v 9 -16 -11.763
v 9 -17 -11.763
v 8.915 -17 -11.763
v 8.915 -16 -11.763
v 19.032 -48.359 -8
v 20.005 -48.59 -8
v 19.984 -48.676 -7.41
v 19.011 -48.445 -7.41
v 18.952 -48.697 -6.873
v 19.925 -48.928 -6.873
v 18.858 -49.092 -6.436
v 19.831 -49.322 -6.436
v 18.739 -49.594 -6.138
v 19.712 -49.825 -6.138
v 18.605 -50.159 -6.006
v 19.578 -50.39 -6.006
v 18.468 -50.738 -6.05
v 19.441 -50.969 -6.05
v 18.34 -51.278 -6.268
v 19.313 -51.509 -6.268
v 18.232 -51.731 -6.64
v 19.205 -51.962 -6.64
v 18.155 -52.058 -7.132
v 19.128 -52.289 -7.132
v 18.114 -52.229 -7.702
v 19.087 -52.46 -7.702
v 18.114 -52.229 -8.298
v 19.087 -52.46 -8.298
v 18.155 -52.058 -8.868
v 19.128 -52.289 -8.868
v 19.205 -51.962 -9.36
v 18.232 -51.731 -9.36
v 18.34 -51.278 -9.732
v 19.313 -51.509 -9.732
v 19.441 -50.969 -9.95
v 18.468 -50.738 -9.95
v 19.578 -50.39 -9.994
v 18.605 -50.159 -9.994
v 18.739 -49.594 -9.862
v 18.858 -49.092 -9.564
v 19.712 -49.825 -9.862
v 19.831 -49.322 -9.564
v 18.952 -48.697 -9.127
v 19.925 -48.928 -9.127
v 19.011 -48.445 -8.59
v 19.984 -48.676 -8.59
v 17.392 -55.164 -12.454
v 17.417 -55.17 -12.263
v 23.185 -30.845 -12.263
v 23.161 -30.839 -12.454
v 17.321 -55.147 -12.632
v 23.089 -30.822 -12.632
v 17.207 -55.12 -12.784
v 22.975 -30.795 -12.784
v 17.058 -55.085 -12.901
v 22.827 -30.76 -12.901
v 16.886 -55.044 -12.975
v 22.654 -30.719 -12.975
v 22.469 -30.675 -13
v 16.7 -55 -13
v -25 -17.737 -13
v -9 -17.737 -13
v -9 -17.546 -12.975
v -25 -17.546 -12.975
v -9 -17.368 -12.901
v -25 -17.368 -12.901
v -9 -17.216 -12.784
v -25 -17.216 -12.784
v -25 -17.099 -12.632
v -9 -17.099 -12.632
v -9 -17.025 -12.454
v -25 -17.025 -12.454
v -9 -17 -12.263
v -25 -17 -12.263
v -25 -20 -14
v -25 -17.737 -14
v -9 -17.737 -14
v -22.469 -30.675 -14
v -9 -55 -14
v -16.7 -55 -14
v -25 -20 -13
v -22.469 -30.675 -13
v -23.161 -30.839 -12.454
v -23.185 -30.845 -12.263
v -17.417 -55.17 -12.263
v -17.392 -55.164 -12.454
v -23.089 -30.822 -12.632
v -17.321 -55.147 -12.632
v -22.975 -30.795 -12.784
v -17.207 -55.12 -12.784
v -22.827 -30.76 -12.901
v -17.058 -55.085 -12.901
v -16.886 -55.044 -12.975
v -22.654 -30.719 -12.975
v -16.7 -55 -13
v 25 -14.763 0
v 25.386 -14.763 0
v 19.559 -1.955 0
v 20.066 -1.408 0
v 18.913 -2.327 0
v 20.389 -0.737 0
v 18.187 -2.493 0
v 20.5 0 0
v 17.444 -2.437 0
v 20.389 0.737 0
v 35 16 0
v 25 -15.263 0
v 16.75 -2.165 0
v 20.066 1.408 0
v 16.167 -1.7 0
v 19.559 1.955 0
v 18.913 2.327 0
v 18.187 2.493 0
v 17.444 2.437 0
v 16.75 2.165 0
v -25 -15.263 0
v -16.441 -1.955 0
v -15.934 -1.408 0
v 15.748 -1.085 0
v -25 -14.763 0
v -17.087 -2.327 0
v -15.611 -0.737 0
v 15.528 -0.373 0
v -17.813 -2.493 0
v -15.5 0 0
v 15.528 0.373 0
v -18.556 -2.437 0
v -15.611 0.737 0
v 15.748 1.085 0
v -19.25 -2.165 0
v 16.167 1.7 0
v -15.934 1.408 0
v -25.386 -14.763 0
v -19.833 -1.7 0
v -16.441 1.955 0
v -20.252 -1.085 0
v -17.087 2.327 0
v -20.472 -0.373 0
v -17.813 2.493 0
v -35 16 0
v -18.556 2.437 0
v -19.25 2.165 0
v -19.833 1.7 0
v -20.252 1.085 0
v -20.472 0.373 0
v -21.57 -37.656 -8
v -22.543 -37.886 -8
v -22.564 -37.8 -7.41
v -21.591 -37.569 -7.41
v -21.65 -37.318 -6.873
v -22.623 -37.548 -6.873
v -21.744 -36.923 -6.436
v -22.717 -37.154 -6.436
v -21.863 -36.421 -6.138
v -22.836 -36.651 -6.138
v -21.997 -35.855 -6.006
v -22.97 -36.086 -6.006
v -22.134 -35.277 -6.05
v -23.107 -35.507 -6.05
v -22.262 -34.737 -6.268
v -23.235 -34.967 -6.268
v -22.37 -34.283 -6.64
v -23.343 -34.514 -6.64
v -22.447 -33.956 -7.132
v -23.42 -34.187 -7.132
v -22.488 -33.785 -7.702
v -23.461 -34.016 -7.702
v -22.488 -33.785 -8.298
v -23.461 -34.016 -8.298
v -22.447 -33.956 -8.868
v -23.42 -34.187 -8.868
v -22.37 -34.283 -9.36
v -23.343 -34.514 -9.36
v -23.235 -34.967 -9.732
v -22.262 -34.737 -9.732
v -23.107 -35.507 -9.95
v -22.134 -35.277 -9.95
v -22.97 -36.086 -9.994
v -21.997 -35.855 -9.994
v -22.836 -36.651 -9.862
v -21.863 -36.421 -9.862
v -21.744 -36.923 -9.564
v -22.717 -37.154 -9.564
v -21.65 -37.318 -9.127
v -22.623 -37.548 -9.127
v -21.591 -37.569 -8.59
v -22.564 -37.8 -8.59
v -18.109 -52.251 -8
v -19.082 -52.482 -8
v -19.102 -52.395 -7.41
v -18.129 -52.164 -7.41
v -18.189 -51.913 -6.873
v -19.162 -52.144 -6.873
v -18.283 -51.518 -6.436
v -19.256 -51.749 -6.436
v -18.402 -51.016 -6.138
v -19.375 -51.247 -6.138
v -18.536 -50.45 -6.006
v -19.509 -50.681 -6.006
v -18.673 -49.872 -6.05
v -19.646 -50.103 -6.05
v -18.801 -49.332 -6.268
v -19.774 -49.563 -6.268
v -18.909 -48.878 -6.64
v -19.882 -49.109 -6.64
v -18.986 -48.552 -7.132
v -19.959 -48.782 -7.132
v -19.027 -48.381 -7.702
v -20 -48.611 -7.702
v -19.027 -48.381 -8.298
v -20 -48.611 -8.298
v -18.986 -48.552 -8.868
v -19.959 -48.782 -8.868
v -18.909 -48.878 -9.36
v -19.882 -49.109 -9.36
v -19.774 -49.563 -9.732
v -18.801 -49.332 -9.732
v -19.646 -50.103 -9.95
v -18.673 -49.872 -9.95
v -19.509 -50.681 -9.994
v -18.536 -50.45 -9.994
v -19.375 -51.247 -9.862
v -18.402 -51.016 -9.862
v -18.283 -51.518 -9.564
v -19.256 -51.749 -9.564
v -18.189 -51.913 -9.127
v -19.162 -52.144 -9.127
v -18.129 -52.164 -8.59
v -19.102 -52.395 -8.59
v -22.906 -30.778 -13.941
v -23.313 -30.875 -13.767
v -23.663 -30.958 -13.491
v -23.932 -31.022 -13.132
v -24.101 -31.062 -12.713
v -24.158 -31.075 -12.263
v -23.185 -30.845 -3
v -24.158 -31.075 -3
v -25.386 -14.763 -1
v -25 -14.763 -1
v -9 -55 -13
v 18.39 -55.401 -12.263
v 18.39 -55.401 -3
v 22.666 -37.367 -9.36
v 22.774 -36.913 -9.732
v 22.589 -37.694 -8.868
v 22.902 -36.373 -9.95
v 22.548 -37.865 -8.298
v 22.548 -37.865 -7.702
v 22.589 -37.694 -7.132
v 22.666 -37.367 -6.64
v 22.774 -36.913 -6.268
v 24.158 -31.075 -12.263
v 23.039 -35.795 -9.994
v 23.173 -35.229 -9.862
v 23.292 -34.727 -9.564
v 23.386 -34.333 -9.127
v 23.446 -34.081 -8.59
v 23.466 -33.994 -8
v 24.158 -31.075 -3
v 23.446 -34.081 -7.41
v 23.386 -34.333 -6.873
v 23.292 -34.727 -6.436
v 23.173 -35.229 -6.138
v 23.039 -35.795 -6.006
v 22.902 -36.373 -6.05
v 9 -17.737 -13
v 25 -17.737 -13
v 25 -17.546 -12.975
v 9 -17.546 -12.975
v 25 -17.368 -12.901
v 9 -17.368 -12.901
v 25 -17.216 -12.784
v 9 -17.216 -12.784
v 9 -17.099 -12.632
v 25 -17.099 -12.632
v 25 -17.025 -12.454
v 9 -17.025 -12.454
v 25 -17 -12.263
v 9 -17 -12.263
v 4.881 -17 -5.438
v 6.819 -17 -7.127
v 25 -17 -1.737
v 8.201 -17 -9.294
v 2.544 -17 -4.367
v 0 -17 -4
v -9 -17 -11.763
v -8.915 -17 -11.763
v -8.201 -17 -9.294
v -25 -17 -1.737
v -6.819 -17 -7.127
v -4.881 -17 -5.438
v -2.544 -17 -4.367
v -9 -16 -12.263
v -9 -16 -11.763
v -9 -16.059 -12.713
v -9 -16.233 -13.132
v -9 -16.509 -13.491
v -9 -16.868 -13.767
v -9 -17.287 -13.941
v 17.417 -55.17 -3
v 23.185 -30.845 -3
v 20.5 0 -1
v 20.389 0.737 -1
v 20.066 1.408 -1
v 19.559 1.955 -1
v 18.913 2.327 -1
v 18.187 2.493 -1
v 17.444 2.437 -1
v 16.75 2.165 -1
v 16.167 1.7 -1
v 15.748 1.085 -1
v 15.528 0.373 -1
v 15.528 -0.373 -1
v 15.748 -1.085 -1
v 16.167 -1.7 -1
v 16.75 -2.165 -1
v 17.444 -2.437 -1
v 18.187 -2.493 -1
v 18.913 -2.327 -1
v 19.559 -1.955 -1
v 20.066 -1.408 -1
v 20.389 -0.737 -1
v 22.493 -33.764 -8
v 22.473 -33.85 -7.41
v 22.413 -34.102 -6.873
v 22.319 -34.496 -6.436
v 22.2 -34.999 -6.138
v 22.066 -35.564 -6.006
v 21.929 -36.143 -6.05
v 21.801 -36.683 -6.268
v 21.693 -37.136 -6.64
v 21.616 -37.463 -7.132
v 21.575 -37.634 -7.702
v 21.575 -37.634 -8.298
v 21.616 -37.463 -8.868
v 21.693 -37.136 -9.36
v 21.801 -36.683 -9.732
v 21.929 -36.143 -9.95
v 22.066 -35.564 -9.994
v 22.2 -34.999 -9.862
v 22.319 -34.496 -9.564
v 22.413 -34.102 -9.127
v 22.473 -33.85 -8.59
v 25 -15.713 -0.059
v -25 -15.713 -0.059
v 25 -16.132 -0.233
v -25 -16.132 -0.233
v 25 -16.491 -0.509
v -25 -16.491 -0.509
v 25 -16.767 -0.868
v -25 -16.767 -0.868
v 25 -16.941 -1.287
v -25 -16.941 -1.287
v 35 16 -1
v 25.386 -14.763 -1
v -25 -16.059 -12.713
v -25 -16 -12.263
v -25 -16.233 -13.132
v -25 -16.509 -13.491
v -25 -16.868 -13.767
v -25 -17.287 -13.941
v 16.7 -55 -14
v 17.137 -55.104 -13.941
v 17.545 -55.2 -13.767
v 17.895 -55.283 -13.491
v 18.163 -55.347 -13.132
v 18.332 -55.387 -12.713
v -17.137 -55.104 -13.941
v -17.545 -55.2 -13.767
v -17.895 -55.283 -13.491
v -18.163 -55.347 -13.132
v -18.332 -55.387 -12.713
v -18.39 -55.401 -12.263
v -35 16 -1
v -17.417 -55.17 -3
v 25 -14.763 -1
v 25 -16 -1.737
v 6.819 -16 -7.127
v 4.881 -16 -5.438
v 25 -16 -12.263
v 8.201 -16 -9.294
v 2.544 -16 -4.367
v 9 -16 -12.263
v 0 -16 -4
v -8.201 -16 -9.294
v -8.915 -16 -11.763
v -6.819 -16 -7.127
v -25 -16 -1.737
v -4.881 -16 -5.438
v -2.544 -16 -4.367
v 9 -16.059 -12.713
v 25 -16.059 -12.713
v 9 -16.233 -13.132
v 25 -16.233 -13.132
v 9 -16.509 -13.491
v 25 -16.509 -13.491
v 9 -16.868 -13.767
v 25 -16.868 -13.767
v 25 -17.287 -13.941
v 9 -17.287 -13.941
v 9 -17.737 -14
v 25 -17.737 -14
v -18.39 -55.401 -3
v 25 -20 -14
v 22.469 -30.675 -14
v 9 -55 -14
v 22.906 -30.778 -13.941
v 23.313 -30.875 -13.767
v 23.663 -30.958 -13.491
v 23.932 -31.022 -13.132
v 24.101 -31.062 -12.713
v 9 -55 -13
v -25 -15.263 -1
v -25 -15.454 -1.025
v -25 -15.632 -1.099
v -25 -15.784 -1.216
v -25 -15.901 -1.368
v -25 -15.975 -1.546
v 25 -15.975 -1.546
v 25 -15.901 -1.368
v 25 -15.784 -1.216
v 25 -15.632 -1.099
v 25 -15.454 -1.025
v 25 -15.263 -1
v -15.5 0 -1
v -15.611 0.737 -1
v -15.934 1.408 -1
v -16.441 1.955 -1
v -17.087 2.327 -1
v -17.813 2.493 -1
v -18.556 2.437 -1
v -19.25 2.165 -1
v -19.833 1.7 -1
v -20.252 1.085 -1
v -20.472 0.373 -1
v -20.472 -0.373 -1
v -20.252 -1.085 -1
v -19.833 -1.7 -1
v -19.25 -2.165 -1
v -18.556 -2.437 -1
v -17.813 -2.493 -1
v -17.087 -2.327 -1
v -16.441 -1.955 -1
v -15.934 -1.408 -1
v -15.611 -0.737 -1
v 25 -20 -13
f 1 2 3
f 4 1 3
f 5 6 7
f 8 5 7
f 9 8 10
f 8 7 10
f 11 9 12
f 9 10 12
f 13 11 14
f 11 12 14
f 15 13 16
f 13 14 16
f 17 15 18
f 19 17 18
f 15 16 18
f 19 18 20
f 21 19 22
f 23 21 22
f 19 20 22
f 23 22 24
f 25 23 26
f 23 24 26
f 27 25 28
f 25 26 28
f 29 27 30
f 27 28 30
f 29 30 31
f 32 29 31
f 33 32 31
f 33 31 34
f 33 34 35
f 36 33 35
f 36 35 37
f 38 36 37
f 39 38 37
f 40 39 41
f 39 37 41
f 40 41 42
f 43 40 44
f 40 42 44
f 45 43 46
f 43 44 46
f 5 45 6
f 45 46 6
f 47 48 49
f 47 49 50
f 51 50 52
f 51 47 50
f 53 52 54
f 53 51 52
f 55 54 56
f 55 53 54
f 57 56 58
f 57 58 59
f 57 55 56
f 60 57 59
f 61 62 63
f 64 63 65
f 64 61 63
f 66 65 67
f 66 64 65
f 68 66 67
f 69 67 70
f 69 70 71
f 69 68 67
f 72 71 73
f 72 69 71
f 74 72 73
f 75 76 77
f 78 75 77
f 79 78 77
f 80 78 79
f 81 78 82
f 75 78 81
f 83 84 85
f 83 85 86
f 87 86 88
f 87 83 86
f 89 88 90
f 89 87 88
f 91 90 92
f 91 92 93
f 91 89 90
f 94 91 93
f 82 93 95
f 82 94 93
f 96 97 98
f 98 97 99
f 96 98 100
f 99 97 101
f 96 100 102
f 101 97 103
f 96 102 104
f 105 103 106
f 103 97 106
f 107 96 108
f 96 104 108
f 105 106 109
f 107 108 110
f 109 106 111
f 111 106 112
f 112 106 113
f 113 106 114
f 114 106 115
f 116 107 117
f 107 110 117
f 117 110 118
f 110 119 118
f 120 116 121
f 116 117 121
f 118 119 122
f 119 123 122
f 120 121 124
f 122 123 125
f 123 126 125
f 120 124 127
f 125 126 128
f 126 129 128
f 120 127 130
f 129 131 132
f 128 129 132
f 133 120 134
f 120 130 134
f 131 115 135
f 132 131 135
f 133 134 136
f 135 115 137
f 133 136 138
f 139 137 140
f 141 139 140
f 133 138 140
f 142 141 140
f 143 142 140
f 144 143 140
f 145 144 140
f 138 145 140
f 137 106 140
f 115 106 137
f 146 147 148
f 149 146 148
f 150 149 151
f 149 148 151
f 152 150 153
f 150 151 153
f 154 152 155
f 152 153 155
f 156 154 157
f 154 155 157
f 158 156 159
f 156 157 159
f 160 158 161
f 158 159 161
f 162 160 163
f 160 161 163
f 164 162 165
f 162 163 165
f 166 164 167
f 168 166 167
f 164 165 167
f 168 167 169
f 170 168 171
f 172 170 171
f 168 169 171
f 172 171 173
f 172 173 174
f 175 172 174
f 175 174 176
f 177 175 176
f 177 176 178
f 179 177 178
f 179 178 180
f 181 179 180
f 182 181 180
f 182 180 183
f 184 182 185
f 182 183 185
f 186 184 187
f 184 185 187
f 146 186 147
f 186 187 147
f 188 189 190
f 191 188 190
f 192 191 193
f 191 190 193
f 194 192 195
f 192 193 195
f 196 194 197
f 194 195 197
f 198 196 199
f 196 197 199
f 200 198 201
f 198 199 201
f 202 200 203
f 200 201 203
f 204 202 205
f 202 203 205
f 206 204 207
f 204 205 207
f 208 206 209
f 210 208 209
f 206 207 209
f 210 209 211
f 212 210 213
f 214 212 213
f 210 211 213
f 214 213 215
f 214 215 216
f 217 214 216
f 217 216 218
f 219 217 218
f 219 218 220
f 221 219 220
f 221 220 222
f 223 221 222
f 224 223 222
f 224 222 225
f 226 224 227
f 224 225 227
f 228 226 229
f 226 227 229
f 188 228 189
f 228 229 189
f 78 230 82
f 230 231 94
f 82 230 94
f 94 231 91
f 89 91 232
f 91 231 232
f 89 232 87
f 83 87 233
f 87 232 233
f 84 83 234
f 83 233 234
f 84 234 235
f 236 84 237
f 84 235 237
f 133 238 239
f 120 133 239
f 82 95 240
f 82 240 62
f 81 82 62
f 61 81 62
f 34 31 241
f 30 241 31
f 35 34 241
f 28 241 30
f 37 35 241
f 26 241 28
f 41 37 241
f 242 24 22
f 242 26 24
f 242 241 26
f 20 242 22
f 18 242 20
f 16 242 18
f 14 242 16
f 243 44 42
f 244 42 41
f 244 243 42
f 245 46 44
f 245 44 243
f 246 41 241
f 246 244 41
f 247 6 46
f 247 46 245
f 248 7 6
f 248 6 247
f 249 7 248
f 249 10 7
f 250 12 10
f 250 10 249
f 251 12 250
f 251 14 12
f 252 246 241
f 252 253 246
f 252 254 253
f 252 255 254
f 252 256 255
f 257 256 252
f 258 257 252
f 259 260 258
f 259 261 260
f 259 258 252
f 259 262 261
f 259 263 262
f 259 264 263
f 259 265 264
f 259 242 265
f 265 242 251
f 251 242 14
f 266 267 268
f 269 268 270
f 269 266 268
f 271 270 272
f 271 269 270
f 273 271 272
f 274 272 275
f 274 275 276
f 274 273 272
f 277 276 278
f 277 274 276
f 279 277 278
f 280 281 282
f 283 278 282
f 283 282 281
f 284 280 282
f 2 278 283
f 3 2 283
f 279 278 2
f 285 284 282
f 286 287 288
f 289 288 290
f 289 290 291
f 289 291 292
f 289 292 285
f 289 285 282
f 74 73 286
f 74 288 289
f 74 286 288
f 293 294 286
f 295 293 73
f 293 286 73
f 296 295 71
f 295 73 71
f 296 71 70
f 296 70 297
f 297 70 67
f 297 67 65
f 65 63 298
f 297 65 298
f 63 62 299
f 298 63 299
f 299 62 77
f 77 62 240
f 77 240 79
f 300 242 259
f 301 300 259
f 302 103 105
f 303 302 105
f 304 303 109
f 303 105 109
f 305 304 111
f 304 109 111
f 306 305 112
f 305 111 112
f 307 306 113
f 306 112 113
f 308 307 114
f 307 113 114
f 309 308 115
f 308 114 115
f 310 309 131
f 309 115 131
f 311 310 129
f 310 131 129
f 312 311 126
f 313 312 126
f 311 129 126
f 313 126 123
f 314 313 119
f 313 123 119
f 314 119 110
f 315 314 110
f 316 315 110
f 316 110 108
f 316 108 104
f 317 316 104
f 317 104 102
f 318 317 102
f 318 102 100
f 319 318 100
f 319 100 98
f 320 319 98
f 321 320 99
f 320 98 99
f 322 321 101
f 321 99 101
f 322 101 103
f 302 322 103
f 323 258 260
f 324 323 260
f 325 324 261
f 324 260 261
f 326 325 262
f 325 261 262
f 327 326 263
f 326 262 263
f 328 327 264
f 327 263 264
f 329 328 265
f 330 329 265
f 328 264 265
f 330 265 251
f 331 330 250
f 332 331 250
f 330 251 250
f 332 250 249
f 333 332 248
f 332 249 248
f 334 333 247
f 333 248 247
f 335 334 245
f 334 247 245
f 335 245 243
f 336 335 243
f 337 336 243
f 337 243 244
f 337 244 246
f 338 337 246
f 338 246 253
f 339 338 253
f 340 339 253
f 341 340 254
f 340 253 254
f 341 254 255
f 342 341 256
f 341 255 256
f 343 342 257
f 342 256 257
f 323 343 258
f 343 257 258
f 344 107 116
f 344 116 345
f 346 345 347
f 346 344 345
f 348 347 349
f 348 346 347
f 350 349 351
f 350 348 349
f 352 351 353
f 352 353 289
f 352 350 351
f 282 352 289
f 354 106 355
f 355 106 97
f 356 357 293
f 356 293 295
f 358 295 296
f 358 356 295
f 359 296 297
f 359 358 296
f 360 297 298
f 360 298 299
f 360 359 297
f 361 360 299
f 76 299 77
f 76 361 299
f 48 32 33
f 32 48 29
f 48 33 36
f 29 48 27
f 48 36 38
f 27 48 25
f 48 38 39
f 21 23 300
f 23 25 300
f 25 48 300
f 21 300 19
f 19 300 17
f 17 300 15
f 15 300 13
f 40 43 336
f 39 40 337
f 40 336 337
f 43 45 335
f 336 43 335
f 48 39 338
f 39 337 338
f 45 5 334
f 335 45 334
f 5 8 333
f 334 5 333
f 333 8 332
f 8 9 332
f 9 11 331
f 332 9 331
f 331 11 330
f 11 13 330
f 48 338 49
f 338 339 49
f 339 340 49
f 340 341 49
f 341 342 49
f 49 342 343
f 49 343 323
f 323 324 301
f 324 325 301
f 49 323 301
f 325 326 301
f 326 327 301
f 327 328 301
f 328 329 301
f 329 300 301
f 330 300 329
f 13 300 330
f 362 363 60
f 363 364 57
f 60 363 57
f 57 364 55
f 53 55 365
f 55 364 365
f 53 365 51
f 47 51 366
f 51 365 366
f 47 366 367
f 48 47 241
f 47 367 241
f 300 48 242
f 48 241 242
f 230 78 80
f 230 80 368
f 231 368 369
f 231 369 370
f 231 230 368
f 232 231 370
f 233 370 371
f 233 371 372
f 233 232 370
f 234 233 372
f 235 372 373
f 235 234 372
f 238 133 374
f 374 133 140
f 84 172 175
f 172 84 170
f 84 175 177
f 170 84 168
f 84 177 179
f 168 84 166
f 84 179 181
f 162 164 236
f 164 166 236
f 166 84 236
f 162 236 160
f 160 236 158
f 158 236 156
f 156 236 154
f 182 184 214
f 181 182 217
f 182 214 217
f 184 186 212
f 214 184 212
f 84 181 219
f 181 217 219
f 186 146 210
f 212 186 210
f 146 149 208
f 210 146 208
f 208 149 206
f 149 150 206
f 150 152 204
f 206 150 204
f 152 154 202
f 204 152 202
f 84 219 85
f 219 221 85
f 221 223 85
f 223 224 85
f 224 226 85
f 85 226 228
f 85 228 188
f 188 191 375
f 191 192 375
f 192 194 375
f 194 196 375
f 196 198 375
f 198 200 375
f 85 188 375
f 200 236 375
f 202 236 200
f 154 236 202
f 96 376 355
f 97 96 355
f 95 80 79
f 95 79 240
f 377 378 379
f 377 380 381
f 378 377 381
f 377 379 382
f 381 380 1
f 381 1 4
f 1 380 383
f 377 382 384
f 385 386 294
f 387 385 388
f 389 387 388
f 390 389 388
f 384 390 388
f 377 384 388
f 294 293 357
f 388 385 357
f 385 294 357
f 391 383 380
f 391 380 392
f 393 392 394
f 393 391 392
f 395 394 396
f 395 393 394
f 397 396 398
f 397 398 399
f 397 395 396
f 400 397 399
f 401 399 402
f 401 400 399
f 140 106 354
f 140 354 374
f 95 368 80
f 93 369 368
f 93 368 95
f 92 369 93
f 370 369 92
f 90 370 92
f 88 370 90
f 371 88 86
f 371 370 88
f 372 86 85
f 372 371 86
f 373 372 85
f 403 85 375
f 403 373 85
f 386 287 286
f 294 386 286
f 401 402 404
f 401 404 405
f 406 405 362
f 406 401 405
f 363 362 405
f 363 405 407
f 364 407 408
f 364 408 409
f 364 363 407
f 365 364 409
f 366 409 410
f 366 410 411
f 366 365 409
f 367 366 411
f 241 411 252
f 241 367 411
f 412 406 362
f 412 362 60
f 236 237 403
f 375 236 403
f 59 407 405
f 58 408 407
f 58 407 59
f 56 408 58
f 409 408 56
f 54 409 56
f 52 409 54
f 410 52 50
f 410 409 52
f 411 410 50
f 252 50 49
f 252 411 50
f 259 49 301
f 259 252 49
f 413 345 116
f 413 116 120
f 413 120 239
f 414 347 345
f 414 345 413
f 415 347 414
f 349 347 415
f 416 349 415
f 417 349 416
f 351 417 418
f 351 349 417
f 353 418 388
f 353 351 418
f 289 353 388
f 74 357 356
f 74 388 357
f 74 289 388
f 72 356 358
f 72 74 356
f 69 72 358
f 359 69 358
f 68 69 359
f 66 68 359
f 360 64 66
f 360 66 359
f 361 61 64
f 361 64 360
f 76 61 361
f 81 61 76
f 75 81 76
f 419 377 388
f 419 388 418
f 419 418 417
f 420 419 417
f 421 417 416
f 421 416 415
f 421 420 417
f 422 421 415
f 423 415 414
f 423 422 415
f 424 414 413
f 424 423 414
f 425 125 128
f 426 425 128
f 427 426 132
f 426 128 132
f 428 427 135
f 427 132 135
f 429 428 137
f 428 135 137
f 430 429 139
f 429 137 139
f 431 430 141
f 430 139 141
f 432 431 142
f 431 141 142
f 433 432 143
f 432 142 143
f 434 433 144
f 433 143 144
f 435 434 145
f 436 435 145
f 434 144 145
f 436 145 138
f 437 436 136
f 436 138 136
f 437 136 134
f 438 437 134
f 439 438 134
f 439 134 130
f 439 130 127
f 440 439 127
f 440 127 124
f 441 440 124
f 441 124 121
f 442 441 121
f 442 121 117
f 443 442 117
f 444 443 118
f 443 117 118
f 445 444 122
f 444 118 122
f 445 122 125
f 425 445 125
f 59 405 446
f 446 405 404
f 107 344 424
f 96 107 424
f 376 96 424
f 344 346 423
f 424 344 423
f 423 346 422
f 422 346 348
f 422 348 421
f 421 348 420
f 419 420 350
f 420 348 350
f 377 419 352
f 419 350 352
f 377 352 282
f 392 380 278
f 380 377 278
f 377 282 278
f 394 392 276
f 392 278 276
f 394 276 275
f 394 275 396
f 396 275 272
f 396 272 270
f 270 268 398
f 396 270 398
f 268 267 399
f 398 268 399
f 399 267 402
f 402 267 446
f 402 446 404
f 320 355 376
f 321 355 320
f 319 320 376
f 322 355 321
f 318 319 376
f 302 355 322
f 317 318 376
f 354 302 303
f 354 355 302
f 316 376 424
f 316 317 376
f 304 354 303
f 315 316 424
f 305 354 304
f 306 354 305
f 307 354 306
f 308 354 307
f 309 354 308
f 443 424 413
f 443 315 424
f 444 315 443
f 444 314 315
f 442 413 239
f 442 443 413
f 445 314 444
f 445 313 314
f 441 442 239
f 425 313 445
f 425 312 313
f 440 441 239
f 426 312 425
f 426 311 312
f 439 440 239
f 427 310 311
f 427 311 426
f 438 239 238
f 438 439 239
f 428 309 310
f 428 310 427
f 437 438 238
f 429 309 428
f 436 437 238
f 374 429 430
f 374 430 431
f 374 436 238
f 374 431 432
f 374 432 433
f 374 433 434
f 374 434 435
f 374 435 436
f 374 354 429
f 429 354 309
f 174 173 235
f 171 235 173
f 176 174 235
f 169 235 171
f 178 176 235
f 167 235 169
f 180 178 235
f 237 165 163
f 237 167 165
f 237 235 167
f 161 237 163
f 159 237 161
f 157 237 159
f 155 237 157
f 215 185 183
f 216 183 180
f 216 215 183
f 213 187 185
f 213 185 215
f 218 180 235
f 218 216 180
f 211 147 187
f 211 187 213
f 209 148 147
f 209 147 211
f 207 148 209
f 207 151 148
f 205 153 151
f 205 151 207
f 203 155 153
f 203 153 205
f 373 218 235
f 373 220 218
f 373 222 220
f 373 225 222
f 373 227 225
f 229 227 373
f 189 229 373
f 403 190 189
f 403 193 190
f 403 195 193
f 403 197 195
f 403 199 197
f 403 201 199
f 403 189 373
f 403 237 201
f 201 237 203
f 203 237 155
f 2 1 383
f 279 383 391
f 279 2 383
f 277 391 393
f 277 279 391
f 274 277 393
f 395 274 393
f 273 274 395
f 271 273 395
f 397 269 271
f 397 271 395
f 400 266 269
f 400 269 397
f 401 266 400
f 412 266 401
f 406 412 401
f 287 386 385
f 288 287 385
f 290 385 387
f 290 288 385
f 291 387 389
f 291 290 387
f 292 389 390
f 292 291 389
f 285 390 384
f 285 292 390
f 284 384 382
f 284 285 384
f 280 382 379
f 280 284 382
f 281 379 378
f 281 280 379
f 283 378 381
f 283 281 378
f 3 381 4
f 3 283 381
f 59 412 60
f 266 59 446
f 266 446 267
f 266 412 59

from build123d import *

# Parameters (mm, degrees)
IZIM1_R                         = 2.5
TABAN_FLAN_1_DEPTH              = 1
KENAR_FLAN_1_STRIP_W            = 5.4732
KENAR_FLAN_1_STRIP_H            = 1
KENAR_FLAN_1_STRIP_CUT_DEPTH    = 50
KENAR_FLAN_1_RELIEF_W           = 5.9732
KENAR_FLAN_1_RELIEF_H           = 0.5
KENAR_FLAN_1_RELIEF_CUT_DEPTH   = 1
KENAR_FLAN_1_DEPTH              = 50
KENAR_FLAN_1_START              = 1
KENAR_FLAN_1_FLAT_DEPTH         = 1
KENAR_FLAN_2_STRIP_W            = 5.4732
KENAR_FLAN_2_STRIP_H            = 1
KENAR_FLAN_2_STRIP_CUT_DEPTH    = 16
KENAR_FLAN_2_RELIEF_W           = 5.9732
KENAR_FLAN_2_RELIEF_H           = 0.5
KENAR_FLAN_2_RELIEF_CUT_DEPTH   = 1
KENAR_FLAN_2_STRIP_2_W          = 5.4732
KENAR_FLAN_2_STRIP_2_H          = 1
KENAR_FLAN_2_STRIP_CUT_2_DEPTH  = 16
KENAR_FLAN_2_RELIEF_2_W         = 5.9732
KENAR_FLAN_2_RELIEF_2_H         = 0.5
KENAR_FLAN_2_RELIEF_CUT_2_DEPTH = 1
KENAR_FLAN_2_DEPTH              = 16
KENAR_FLAN_2_BEND_DEPTH         = 16
KES_EKSTR_ZYON1_DEPTH           = 10
KENAR_FLAN_3_DEPTH              = 25
KENAR_FLAN_3_START              = 1
KENAR_FLAN_3_PROFILE_W          = 25
KENAR_FLAN_3_PROFILE_H          = 9.2634
KENAR_FLAN_3_PROFILE_R          = 2
KENAR_FLAN_3_FLAT_DEPTH         = 1
KENAR_FLAN_3_BEND_DEPTH         = 25
KENAR_FLAN_3_PROFILE_2_W        = 25
KENAR_FLAN_3_PROFILE_2_H        = 9.2634
KENAR_FLAN_3_PROFILE_2_R        = 2
KENAR_FLAN_3_FLAT_2_DEPTH       = 1


# Sheet-metal steps are written as plain solids
with BuildPart() as part:
    # Çizim1 → Taban-Flanş1 (new body)
    with BuildSketch(Plane.XY):
        Polygon((-25, 16), (25, 16), (35, 16), (25, -16), (-25, -16), (-35, 16), align=None)
        with Locations((-18, 0)):
            Circle(IZIM1_R, mode=Mode.SUBTRACT)
        with Locations((18, 0)):
            Circle(IZIM1_R, mode=Mode.SUBTRACT)
    extrude(amount=-TABAN_FLAN_1_DEPTH)

    # Kenar-Flanş1 strip (across the edge) → Kenar-Flanş1 strip cut (cut)
    with BuildSketch(Plane(origin=(25, -16, -1), x_dir=(0, 1, 0), z_dir=(-1, 0, 0))):
        with Locations((-2, -0.5)):
            Rectangle(KENAR_FLAN_1_STRIP_W, KENAR_FLAN_1_STRIP_H)
    extrude(amount=KENAR_FLAN_1_STRIP_CUT_DEPTH, mode=Mode.SUBTRACT)

    # Kenar-Flanş1 relief (on the sheet) → Kenar-Flanş1 relief cut (cut)
    with BuildSketch(Plane(origin=(25, -15.2634, -1), x_dir=(0, 1, 0), z_dir=(0, 0, -1))):
        with Locations((-2.4866, 0.25)):
            Rectangle(KENAR_FLAN_1_RELIEF_W, KENAR_FLAN_1_RELIEF_H)
        with Locations((-2.4866, -50.25)):
            Rectangle(KENAR_FLAN_1_RELIEF_W, KENAR_FLAN_1_RELIEF_H)
    extrude(amount=-KENAR_FLAN_1_RELIEF_CUT_DEPTH, mode=Mode.SUBTRACT)

    # Kenar-Flanş1 bend section (across the edge) → Kenar-Flanş1 (add)
    with BuildSketch(Plane(origin=(25, -16, -1), x_dir=(0, 1, 0), z_dir=(-1, 0, 0))):
        with BuildLine():
            Line((-1, 0.7366), (0, 0.7366))
            ThreePointArc((0, 0.7366), (0.215745145, 0.215745145), (0.7366, 0))
            Line((0.7366, 0), (0.7366, -1))
            ThreePointArc((0.7366, -1), (-0.491361636, -0.491361636), (-1, 0.7366))
        make_face()
    extrude(amount=KENAR_FLAN_1_DEPTH)

    # Kenar-Flanş1 profile (on flange) → Kenar-Flanş1 flat (add)
    with BuildSketch(Plane(origin=(0, -16, -1), x_dir=(-1, 0, 0), z_dir=(0, -1, 0)).offset(KENAR_FLAN_1_START)):
        with BuildLine():
            Line((25, 0.7366), (25, 12))
            Line((25, 12), (9, 12))
            ThreePointArc((9, 12), (0, 3), (-9, 12))
            Line((-9, 12), (-25, 12))
            Line((-25, 12), (-25, 0.7366))
            Line((-25, 0.7366), (25, 0.7366))
        make_face()
    extrude(amount=-KENAR_FLAN_1_FLAT_DEPTH)

    # Kenar-Flanş2 strip (across the edge) → Kenar-Flanş2 strip cut (cut)
    with BuildSketch(Plane(origin=(9, -17, -13), x_dir=(0, 0, 1), z_dir=(1, 0, 0))):
        with Locations((-2, -0.5)):
            Rectangle(KENAR_FLAN_2_STRIP_W, KENAR_FLAN_2_STRIP_H)
    extrude(amount=KENAR_FLAN_2_STRIP_CUT_DEPTH, mode=Mode.SUBTRACT)

    # Kenar-Flanş2 relief (on the sheet) → Kenar-Flanş2 relief cut (cut)
    with BuildSketch(Plane(origin=(9, -17, -12.2634), x_dir=(0, 0, 1), z_dir=(0, -1, 0))):
        with Locations((-2.4866, 0.25)):
            Rectangle(KENAR_FLAN_2_RELIEF_W, KENAR_FLAN_2_RELIEF_H)
    extrude(amount=-KENAR_FLAN_2_RELIEF_CUT_DEPTH, mode=Mode.SUBTRACT)

    # Kenar-Flanş2 strip 2 (across the edge) → Kenar-Flanş2 strip cut 2 (cut)
    with BuildSketch(Plane(origin=(-25, -17, -13), x_dir=(0, 0, 1), z_dir=(1, 0, 0))):
        with Locations((-2, -0.5)):
            Rectangle(KENAR_FLAN_2_STRIP_2_W, KENAR_FLAN_2_STRIP_2_H)
    extrude(amount=KENAR_FLAN_2_STRIP_CUT_2_DEPTH, mode=Mode.SUBTRACT)

    # Kenar-Flanş2 relief 2 (on the sheet) → Kenar-Flanş2 relief cut 2 (cut)
    with BuildSketch(Plane(origin=(-25, -17, -12.2634), x_dir=(0, 0, 1), z_dir=(0, -1, 0))):
        with Locations((-2.4866, -16.25)):
            Rectangle(KENAR_FLAN_2_RELIEF_2_W, KENAR_FLAN_2_RELIEF_2_H)
    extrude(amount=-KENAR_FLAN_2_RELIEF_CUT_2_DEPTH, mode=Mode.SUBTRACT)

    # Kenar-Flanş2 section (across the edge) → Kenar-Flanş2 (add)
    with BuildSketch(Plane(origin=(9, -17, -13), x_dir=(0, 0, 1), z_dir=(1, 0, 0))):
        with BuildLine():
            Line((-1, 0.7366), (-1, 38))
            Line((-1, 38), (0, 38))
            Line((0, 38), (0, 0.7366))
            ThreePointArc((0, 0.7366), (0.215745145, 0.215745145), (0.7366, 0))
            Line((0.7366, 0), (0.7366, -1))
            ThreePointArc((0.7366, -1), (-0.491361636, -0.491361636), (-1, 0.7366))
        make_face()
    extrude(amount=KENAR_FLAN_2_DEPTH)

    # Kenar-Flanş2 section 2 (across the edge) → Kenar-Flanş2 bend (add)
    with BuildSketch(Plane(origin=(-25, -17, -13), x_dir=(0, 0, 1), z_dir=(1, 0, 0))):
        with BuildLine():
            Line((-1, 0.7366), (-1, 38))
            Line((-1, 38), (0, 38))
            Line((0, 38), (0, 0.7366))
            ThreePointArc((0, 0.7366), (0.215745145, 0.215745145), (0.7366, 0))
            Line((0.7366, 0), (0.7366, -1))
            ThreePointArc((0.7366, -1), (-0.491361636, -0.491361636), (-1, 0.7366))
        make_face()
    extrude(amount=KENAR_FLAN_2_BEND_DEPTH)

    # Çizim11 → Kes-Ekstrüzyon1 (cut)
    with BuildSketch(Plane(origin=(0, 0, -14), x_dir=(-1, 0, 0), z_dir=(0, 0, -1))):
        Polygon((-16.7, -55), (-25, -20), (-25, -55), align=None)
        Polygon((25, -55), (16.7, -55), (25, -20), align=None)
    extrude(amount=-KES_EKSTR_ZYON1_DEPTH, mode=Mode.SUBTRACT)

    # Kenar-Flanş3 bend section (across the edge) → Kenar-Flanş3 (add)
    with BuildSketch(Plane(origin=(17.41672257, -55.169965638, -13), x_dir=(-0.973014620822144, 0.23074346722353695, 3.4914813388431334e-15), z_dir=(0.23074346722353695, 0.973014620822144, 0))):
        with BuildLine():
            Line((-1, 0.7366), (0, 0.7366))
            ThreePointArc((0, 0.7366), (0.215745145, 0.215745145), (0.7366, 0))
            Line((0.7366, 0), (0.7366, -1))
            ThreePointArc((0.7366, -1), (-0.491361636, -0.491361636), (-1, 0.7366))
        make_face()
    extrude(amount=KENAR_FLAN_3_DEPTH)

    # Kenar-Flanş3 profile (on flange) → Kenar-Flanş3 flat (add)
    with BuildSketch(Plane(origin=(28.875994223, -6.847735773, -13), x_dir=(0.23074346722353695, 0.973014620822144, 0), z_dir=(0.973014620822144, -0.23074346722353695, -3.4914813388431334e-15)).offset(KENAR_FLAN_3_START)):
        with Locations((-37.162388243, 5.3683)):
            Rectangle(KENAR_FLAN_3_PROFILE_W, KENAR_FLAN_3_PROFILE_H)
        with Locations((-44.662388243, 5)):
            Circle(KENAR_FLAN_3_PROFILE_R, mode=Mode.SUBTRACT)
        with Locations((-29.662388243, 5)):
            Circle(KENAR_FLAN_3_PROFILE_R, mode=Mode.SUBTRACT)
    extrude(amount=-KENAR_FLAN_3_FLAT_DEPTH)

    # Kenar-Flanş3 bend section 2 (across the edge) → Kenar-Flanş3 bend (add)
    with BuildSketch(Plane(origin=(-23.18530925, -30.844600117, -13), x_dir=(0.973014620822144, 0.2307434672235371, 3.807964708569791e-15), z_dir=(0.2307434672235371, -0.973014620822144, 0))):
        with BuildLine():
            Line((-1, 0.7366), (0, 0.7366))
            ThreePointArc((0, 0.7366), (0.215745145, 0.215745145), (0.7366, 0))
            Line((0.7366, 0), (0.7366, -1))
            ThreePointArc((0.7366, -1), (-0.491361636, -0.491361636), (-1, 0.7366))
        make_face()
    extrude(amount=KENAR_FLAN_3_BEND_DEPTH)

    # Kenar-Flanş3 profile 2 (on flange) → Kenar-Flanş3 flat 2 (add)
    with BuildSketch(Plane(origin=(-28.875994223, -6.847735773, -13), x_dir=(0.2307434672235371, -0.973014620822144, 0), z_dir=(-0.973014620822144, -0.2307434672235371, -3.807964708569791e-15)).offset(KENAR_FLAN_3_START)):
        with Locations((37.162388243, 5.3683)):
            Rectangle(KENAR_FLAN_3_PROFILE_2_W, KENAR_FLAN_3_PROFILE_2_H)
        with Locations((29.662388243, 5)):
            Circle(KENAR_FLAN_3_PROFILE_2_R, mode=Mode.SUBTRACT)
        with Locations((44.662388243, 5)):
            Circle(KENAR_FLAN_3_PROFILE_2_R, mode=Mode.SUBTRACT)
    extrude(amount=-KENAR_FLAN_3_FLAT_2_DEPTH)


solid = part.part
